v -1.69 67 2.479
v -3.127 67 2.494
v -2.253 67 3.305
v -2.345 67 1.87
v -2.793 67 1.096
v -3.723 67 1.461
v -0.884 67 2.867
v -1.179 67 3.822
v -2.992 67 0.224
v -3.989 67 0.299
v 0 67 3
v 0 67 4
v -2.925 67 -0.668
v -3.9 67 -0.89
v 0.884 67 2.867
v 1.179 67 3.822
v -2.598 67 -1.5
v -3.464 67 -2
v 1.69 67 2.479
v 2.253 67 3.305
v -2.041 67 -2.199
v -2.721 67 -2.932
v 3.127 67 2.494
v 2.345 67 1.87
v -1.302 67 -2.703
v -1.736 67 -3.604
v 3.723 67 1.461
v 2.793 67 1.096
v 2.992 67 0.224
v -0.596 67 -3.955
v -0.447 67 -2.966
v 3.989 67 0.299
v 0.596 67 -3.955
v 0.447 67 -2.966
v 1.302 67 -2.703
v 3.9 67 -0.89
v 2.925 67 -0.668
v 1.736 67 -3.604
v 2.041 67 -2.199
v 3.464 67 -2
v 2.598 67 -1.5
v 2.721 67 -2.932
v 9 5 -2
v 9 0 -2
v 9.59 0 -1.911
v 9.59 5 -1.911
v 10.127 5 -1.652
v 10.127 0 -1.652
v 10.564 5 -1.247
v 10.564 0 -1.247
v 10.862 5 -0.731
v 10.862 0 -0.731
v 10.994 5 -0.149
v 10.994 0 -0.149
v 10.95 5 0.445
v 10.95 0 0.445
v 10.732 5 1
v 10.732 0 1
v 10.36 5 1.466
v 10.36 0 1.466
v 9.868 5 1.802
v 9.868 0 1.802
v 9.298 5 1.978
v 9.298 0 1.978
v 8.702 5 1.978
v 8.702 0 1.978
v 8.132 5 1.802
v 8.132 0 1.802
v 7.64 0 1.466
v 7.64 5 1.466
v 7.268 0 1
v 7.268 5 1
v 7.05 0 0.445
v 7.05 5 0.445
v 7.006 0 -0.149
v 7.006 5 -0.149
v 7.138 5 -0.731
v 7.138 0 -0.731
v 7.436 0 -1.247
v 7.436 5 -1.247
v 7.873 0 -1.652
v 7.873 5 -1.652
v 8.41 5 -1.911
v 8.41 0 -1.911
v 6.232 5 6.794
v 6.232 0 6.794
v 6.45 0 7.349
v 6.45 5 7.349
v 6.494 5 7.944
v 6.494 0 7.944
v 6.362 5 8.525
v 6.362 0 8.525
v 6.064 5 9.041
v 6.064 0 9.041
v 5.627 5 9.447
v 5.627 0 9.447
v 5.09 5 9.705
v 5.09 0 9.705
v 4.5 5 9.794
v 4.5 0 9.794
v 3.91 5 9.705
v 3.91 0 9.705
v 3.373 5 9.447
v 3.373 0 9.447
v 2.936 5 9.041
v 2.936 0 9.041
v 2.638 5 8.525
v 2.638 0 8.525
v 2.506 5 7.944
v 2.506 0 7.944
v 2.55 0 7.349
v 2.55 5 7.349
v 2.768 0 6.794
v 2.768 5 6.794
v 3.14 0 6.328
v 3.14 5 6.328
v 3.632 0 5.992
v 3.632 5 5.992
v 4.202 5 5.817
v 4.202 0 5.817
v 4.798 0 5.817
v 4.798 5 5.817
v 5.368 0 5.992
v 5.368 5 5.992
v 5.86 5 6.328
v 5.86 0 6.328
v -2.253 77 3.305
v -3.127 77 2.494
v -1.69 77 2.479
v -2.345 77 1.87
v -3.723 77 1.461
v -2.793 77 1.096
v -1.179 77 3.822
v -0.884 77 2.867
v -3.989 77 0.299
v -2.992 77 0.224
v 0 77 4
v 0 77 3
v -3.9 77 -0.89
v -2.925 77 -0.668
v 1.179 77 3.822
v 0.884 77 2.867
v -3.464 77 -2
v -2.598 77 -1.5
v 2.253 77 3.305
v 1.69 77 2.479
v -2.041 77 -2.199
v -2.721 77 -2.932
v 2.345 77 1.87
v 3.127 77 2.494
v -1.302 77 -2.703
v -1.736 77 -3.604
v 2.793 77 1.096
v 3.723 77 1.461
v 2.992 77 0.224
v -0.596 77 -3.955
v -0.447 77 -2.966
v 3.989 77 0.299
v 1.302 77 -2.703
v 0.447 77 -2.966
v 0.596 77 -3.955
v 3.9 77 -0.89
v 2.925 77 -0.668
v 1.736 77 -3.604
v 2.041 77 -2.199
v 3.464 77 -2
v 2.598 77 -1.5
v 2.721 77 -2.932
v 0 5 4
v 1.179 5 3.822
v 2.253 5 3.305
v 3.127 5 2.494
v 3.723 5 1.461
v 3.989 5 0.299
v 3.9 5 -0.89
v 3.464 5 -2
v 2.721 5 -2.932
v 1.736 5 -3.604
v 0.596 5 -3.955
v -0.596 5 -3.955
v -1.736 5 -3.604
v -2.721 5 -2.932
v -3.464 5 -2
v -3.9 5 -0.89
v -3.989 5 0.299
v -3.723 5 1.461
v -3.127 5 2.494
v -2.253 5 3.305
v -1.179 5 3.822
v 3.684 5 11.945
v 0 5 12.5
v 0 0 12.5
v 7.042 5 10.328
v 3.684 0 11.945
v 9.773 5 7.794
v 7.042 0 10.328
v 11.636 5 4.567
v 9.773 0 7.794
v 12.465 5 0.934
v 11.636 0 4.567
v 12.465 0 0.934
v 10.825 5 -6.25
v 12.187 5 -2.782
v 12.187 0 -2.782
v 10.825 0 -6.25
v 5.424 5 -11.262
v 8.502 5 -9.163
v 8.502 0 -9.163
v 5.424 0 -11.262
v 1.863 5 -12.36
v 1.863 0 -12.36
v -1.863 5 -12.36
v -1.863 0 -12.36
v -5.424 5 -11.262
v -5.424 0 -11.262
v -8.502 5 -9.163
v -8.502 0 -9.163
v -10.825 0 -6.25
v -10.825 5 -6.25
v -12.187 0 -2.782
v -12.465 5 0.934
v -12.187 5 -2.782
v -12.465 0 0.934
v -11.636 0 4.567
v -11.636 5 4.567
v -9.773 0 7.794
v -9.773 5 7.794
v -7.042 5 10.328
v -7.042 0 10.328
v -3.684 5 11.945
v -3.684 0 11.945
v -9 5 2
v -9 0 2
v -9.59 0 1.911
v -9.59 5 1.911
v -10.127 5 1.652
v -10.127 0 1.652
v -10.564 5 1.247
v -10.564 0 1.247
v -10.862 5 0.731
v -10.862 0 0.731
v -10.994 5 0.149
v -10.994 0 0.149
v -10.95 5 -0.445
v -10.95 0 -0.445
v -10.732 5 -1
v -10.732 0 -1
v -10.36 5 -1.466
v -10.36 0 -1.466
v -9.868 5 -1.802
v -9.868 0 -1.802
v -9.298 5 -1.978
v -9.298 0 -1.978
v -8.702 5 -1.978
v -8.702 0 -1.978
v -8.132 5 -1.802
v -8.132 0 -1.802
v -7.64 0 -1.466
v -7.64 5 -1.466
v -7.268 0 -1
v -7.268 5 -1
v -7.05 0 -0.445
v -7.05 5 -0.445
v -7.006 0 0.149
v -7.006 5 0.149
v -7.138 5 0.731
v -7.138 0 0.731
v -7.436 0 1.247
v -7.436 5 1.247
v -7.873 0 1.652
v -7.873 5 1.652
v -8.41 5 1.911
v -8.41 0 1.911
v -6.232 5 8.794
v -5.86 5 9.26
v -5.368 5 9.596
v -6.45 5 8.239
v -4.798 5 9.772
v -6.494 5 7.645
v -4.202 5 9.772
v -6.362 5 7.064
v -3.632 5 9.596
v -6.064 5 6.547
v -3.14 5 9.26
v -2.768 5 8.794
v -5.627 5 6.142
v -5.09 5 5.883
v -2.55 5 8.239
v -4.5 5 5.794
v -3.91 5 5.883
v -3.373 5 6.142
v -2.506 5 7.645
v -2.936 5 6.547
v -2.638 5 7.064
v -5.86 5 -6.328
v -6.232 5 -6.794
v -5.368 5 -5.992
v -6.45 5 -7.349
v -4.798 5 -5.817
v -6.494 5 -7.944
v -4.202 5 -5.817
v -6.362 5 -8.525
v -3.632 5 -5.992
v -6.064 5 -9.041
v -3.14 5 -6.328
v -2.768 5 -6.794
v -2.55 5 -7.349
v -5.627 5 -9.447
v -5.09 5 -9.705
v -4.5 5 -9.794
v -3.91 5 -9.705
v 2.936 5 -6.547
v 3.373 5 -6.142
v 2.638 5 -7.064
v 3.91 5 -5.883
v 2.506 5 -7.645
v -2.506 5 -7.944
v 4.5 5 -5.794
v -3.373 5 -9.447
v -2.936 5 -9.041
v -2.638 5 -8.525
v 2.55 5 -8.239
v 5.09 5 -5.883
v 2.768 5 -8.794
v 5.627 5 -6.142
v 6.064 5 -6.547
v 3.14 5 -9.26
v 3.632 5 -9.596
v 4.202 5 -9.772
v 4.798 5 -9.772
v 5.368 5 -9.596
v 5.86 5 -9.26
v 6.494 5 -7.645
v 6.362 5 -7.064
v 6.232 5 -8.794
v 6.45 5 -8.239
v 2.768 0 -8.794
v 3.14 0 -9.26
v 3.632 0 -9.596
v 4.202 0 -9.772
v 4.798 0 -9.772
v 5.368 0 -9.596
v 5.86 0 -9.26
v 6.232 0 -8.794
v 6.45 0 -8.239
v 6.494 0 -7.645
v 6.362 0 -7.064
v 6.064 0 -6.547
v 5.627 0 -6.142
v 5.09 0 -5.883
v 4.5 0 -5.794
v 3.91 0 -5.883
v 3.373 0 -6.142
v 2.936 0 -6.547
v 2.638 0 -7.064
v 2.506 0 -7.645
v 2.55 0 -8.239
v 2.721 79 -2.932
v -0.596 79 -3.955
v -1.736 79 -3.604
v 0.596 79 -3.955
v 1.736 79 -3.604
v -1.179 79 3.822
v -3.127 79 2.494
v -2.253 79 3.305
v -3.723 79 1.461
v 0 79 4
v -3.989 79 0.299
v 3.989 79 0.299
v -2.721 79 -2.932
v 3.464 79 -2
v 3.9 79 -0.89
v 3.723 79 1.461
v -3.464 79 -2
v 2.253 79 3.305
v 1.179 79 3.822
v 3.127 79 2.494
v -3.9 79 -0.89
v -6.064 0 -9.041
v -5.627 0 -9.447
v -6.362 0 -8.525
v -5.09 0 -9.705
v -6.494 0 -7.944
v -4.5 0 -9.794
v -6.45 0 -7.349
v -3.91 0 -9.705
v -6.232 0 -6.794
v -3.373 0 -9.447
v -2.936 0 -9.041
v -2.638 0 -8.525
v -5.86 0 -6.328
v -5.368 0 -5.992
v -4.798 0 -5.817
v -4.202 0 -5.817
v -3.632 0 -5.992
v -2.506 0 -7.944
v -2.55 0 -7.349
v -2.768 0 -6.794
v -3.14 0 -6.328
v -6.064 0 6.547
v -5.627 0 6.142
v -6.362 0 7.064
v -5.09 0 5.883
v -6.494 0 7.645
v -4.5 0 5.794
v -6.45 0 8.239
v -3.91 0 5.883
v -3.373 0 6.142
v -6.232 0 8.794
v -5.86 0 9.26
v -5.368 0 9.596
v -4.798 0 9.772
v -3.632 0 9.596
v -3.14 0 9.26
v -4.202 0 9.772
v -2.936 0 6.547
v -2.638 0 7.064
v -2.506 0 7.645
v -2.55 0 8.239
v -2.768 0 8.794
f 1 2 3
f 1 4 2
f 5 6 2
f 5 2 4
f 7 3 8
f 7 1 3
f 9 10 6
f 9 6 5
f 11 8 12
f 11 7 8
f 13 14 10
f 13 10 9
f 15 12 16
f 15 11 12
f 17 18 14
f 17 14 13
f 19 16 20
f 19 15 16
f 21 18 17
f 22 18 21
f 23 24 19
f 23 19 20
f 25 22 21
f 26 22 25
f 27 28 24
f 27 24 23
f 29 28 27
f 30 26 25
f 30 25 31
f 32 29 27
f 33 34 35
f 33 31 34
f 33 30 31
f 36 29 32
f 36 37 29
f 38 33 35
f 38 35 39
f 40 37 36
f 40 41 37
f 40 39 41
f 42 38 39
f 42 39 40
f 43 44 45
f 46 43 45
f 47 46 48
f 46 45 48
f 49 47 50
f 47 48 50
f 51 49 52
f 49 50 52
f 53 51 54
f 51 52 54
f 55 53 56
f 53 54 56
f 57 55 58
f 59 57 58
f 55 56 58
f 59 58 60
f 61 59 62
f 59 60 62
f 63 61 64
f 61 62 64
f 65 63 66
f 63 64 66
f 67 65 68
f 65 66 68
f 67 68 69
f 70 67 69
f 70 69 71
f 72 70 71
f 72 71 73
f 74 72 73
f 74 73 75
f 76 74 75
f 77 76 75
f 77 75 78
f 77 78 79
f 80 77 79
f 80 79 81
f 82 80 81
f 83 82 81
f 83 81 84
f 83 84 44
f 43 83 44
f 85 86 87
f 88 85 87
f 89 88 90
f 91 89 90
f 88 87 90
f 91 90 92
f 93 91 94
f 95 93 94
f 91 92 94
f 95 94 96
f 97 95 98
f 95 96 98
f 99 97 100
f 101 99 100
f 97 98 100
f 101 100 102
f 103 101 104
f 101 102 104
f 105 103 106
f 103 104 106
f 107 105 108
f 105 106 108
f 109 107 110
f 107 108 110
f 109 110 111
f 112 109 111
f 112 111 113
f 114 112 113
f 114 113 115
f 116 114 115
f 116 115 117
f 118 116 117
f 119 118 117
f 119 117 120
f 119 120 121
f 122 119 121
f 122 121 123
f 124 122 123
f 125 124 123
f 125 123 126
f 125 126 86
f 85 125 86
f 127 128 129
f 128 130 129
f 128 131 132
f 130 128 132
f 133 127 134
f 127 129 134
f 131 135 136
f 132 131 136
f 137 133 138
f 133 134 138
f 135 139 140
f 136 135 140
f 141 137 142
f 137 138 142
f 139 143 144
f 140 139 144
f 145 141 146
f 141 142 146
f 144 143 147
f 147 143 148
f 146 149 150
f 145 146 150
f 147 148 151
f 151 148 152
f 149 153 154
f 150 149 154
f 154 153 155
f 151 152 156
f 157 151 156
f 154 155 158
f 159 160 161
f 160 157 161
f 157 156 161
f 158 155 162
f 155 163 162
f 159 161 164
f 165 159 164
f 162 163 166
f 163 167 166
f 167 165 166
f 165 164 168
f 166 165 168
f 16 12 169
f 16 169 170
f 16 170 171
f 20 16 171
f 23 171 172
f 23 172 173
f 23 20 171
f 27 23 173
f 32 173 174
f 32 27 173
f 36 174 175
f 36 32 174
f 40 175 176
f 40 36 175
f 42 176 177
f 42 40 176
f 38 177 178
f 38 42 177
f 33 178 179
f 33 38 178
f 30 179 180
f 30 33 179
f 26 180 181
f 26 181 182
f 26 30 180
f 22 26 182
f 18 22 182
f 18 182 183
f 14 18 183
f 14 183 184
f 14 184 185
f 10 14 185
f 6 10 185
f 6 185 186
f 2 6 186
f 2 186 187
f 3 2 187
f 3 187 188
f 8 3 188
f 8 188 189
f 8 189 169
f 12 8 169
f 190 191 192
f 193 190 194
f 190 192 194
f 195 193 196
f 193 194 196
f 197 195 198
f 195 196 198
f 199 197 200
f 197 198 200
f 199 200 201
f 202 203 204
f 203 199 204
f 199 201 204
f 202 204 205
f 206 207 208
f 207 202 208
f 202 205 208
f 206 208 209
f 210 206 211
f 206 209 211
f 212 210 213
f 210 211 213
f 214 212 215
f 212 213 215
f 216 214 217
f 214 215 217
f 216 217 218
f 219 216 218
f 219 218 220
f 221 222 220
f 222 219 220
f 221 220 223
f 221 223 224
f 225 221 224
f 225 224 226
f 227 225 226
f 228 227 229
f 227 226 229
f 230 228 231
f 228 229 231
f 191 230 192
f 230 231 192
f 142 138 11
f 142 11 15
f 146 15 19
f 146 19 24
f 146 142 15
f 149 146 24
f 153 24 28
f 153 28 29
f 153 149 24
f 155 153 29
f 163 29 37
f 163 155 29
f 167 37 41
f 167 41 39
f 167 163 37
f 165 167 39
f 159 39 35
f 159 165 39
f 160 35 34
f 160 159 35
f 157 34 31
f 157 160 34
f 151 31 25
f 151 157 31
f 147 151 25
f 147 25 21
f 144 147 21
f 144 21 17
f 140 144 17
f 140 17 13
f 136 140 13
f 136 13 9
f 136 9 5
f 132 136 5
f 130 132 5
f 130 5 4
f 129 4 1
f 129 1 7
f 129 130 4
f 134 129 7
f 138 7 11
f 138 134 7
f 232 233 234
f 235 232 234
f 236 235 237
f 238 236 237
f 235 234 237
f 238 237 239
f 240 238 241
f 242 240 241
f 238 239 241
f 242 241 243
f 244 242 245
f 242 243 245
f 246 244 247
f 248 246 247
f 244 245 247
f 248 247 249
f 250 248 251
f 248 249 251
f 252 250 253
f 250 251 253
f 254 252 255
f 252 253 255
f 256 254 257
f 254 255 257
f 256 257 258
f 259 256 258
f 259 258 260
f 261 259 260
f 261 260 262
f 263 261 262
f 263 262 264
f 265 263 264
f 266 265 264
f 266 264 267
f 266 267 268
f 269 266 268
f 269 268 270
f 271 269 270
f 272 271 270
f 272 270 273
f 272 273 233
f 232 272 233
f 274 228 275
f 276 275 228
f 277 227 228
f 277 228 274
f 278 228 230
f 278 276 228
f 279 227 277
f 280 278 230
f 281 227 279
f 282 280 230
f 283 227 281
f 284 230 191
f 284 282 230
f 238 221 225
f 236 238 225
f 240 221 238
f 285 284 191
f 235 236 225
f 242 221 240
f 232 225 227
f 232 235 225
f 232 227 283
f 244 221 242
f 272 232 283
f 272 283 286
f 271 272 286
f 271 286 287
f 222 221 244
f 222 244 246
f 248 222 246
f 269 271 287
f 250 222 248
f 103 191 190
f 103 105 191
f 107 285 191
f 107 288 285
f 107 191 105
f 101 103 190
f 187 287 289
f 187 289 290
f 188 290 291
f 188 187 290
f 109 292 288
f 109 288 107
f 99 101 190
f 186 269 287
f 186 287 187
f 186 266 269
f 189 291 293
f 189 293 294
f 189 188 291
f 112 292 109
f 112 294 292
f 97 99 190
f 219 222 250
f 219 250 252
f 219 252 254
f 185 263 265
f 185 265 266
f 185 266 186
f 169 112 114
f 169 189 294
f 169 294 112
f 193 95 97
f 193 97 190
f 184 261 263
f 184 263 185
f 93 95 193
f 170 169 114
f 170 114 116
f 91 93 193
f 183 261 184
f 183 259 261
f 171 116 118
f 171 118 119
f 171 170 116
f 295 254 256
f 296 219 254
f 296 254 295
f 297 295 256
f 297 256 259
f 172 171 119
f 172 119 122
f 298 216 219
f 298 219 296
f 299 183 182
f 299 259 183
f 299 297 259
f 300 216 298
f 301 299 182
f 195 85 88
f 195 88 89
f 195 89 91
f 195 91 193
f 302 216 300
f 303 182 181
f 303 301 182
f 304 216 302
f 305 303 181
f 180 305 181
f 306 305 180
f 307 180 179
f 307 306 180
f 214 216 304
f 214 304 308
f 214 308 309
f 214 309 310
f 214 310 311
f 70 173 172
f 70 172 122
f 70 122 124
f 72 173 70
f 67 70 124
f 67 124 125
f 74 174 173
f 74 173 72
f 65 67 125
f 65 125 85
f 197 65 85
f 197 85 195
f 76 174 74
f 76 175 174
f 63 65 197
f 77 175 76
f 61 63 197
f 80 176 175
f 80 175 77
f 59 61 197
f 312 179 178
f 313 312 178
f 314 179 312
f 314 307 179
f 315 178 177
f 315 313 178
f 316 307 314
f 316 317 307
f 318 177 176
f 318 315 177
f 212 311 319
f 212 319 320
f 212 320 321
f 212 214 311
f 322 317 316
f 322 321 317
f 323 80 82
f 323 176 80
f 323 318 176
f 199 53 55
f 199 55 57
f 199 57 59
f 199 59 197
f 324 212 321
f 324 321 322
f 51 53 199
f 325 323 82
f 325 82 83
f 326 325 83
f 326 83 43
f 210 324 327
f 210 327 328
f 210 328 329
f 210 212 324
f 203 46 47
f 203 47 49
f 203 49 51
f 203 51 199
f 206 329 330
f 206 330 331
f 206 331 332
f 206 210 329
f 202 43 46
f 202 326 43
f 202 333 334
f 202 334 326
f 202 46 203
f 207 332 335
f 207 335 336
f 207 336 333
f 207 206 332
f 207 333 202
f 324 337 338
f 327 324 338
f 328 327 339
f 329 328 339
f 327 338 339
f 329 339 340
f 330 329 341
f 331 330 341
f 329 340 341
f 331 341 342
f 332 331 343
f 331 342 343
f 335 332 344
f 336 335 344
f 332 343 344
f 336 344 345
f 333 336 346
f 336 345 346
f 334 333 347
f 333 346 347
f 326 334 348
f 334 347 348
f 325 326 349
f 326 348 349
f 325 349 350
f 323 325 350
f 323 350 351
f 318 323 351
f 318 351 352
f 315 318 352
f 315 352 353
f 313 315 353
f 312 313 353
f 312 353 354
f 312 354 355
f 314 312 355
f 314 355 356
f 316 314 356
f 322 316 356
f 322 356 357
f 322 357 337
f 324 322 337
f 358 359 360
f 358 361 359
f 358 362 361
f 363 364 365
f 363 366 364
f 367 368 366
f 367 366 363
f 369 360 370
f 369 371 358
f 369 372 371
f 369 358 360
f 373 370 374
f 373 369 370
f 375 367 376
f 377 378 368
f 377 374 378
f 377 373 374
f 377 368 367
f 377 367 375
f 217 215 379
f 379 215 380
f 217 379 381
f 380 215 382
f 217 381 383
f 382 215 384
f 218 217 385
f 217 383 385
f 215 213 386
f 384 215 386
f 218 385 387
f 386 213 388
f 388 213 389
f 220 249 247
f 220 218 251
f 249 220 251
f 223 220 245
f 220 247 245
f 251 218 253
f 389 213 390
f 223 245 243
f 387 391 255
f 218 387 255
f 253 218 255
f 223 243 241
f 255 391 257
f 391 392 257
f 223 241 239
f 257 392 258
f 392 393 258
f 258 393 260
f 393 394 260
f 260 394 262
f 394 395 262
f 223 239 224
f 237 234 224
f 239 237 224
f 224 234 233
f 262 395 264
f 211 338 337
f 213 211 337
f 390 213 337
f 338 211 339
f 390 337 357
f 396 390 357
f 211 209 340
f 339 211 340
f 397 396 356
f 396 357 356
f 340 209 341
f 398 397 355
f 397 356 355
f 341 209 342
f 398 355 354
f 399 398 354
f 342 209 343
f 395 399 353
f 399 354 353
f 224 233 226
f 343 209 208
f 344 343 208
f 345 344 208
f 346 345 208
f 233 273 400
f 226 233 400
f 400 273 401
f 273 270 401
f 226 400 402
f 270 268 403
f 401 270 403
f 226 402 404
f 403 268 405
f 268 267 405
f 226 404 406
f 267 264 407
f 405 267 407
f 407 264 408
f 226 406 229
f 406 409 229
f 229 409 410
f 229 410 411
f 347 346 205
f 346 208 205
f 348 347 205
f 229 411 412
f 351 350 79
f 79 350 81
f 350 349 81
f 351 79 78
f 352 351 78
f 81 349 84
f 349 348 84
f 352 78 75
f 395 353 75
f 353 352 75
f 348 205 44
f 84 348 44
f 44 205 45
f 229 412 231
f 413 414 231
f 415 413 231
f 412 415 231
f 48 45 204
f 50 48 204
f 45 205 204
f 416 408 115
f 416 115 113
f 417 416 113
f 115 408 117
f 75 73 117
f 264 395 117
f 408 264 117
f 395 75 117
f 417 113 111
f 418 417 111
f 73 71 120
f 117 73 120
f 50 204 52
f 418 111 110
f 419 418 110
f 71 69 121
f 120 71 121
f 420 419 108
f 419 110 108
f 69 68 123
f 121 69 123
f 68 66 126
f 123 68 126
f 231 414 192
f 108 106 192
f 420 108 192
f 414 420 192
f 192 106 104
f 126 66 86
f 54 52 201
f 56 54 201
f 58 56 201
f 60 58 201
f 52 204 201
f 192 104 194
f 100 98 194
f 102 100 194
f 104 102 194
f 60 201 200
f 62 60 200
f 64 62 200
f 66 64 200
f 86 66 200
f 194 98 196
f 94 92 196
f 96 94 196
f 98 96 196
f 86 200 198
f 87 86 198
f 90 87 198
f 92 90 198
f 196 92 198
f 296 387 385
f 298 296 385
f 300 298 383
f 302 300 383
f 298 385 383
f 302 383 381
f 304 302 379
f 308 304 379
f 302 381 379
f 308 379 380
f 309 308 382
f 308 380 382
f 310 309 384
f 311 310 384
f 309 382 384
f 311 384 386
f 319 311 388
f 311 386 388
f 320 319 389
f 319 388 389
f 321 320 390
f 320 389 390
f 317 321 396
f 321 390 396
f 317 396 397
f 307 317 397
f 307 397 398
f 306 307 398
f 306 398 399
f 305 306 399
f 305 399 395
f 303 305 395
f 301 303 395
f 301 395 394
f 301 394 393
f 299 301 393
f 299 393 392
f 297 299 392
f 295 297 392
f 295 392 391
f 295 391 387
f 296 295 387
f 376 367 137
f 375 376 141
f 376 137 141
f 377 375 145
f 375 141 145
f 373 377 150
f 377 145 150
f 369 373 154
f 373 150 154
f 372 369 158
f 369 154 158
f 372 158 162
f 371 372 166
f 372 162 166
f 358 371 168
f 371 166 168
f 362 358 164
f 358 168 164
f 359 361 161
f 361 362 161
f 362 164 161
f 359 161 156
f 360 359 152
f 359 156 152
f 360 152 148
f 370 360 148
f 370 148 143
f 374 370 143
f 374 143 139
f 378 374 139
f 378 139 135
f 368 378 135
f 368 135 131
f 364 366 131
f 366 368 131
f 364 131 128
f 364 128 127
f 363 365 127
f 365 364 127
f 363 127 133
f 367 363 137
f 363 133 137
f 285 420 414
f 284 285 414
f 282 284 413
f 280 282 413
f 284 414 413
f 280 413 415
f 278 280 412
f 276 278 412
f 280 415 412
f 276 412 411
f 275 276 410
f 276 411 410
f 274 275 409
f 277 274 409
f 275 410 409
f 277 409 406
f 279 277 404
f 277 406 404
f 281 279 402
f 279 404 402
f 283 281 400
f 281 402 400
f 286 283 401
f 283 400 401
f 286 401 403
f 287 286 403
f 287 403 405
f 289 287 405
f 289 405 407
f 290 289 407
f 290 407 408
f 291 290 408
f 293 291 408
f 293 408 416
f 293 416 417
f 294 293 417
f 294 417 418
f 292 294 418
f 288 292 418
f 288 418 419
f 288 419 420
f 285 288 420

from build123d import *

# Parameters (mm, degrees)
SKETCH_1_R               = 12.5
EXTRUDE_1_DEPTH          = 79
SKETCH_2_OUTSIDE_W       = 44.31
SKETCH_2_OUTSIDE_H       = 44.31
SKETCH_2_OUTSIDE_R       = 4
CUT_EXTRUDE_2_DEPTH      = 72
SKETCH_4_OUTSIDE_W       = 44.31
SKETCH_4_OUTSIDE_H       = 44.31
SKETCH_4_OUTSIDE_R       = 4
CUT_EXTRUDE_3_DEPTH      = 80.003164494
SKETCH_6_OUTSIDE_W       = 44.31
SKETCH_6_OUTSIDE_H       = 44.31
SKETCH_6_OUTSIDE_R       = 3
CUT_EXTRUDE_4_DEPTH      = 10
SKETCH_7_R               = 2
CUT_EXTRUDE_5_DEPTH      = 81.953690466
PATTERN_CIRCULAR_1_COUNT = 6


with BuildPart() as part:
    # 草图1 → 凸台-拉伸1 (new body)
    with BuildSketch(Plane(origin=(0, 0, 0), x_dir=(1, 0, 0), z_dir=(0, 1, 0))):
        with Locations(Location((0, 0, 0), (0, 0, 270))):
            Circle(SKETCH_1_R)
    extrude(amount=EXTRUDE_1_DEPTH)

    # 草图2 outside → 切除-拉伸2 (cut)
    with BuildSketch(Plane(origin=(0, 77, 0), x_dir=(1, 0, 0), z_dir=(0, 1, 0))):
        Rectangle(SKETCH_2_OUTSIDE_W, SKETCH_2_OUTSIDE_H)
        with Locations(Location((0, 0, 0), (0, 0, 270))):
            Circle(SKETCH_2_OUTSIDE_R, mode=Mode.SUBTRACT)
    extrude(amount=-CUT_EXTRUDE_2_DEPTH, mode=Mode.SUBTRACT)

    # 草图4 outside → 切除-拉伸3 (cut, through all)
    with BuildSketch(Plane(origin=(0, 77, 0), x_dir=(1, 0, 0), z_dir=(0, 1, 0))):
        Rectangle(SKETCH_4_OUTSIDE_W, SKETCH_4_OUTSIDE_H)
        with Locations(Location((0, 0, 0), (0, 0, 270))):
            Circle(SKETCH_4_OUTSIDE_R, mode=Mode.SUBTRACT)
    extrude(amount=CUT_EXTRUDE_3_DEPTH, mode=Mode.SUBTRACT)

    # 草图6 outside → 切除-拉伸4 (cut)
    with BuildSketch(Plane(origin=(0, 77, 0), x_dir=(1, 0, 0), z_dir=(0, 1, 0))):
        Rectangle(SKETCH_6_OUTSIDE_W, SKETCH_6_OUTSIDE_H)
        with Locations(Location((0, 0, 0), (0, 0, 270))):
            Circle(SKETCH_6_OUTSIDE_R, mode=Mode.SUBTRACT)
    extrude(amount=-CUT_EXTRUDE_4_DEPTH, mode=Mode.SUBTRACT)

    # 草图7 → 切除-拉伸5 (cut, through all)
    with BuildSketch(Plane.XZ):
        with Locations(Location((9, 0, 0), (0, 0, 270))):
            Circle(SKETCH_7_R)
    cut_extrude_5 = extrude(amount=-CUT_EXTRUDE_5_DEPTH, mode=Mode.SUBTRACT)

    # 阵列(圆周)1: 切除-拉伸5 ×6 about axis
    pattern_circular_1_axis = Axis((0, 0, 0), (0, 1, 0))
    for i in range(1, PATTERN_CIRCULAR_1_COUNT):
        add(cut_extrude_5.rotate(pattern_circular_1_axis, i * 360 / PATTERN_CIRCULAR_1_COUNT), mode=Mode.SUBTRACT)


solid = part.part
